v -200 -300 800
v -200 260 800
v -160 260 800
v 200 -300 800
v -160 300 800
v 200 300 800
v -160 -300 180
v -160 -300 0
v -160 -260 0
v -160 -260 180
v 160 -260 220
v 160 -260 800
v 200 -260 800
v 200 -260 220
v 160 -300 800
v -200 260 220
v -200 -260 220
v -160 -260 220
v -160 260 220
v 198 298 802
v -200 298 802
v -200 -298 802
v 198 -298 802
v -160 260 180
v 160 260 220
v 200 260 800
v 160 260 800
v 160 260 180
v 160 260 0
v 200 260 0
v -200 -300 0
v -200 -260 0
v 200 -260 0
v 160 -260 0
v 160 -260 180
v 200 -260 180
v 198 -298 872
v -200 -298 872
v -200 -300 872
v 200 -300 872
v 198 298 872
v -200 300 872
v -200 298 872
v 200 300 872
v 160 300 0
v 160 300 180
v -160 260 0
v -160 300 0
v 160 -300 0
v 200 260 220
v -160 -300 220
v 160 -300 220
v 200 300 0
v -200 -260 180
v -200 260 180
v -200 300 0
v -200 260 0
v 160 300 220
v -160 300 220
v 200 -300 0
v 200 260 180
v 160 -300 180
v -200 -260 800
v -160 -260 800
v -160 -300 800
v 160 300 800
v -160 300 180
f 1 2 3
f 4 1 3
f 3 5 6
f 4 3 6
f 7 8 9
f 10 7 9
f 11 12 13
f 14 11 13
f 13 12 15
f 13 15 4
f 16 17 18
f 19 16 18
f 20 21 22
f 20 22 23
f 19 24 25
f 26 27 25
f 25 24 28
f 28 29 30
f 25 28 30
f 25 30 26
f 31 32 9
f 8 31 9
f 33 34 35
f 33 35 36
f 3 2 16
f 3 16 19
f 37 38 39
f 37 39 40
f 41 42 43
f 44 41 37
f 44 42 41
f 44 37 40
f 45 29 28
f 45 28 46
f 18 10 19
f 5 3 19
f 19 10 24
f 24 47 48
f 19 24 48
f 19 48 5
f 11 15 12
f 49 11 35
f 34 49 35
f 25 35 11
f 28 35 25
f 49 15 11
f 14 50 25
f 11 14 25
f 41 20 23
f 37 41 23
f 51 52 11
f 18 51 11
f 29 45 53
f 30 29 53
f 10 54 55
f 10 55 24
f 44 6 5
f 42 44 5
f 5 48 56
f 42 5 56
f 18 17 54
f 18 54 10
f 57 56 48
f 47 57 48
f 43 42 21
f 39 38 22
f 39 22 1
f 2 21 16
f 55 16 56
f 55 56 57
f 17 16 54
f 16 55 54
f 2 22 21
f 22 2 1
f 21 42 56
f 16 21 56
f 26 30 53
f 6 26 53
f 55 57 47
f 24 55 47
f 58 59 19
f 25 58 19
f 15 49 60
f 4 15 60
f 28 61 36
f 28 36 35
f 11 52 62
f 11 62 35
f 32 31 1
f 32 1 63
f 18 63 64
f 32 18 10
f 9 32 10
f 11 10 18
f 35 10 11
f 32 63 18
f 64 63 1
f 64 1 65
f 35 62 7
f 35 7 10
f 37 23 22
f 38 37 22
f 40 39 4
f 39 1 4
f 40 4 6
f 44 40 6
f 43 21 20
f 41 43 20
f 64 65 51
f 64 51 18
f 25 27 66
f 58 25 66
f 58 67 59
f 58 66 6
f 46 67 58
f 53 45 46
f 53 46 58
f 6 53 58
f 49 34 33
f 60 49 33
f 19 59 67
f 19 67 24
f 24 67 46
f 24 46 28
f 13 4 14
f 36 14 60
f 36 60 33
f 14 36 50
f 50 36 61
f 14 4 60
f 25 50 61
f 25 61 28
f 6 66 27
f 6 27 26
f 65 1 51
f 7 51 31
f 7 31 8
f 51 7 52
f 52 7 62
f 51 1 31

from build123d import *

# Parameters (mm, degrees)
F0_W      = 40
F0_H      = 40
F1_DEPTH  = 800
F2_W      = 400
F2_H      = 600
F3_DEPTH  = 2
F5_DEPTH  = 70
F6_W      = 40
F6_H      = 40
F7_DEPTH  = 520
F8_W      = 40
F8_H      = 40
F9_DEPTH  = 320
F10_W     = 40
F10_H     = 40
F11_DEPTH = 520
F12_W     = 40
F12_H     = 40
F13_DEPTH = 320


with BuildPart() as f1:
    # F0 (on Top) → F1 (new body)
    with BuildSketch(Plane.XY):
        with Locations((-180, 280)):
            Rectangle(F0_W, F0_H)
    extrude(amount=F1_DEPTH)

    # F2 (on face) → F3 (join)
    with BuildSketch(Plane.XY.offset(800)):
        Rectangle(F2_W, F2_H)
    extrude(amount=F3_DEPTH)

    # F4 (on face) → F5 (join)
    with BuildSketch(Plane.XY.offset(802)):
        Polygon((200, 300), (-200, 300), (-200, 298), (198, 298), (198, -298), (-200, -298), (-200, -300), (200, -300), align=None)
    extrude(amount=F5_DEPTH)

    # F6 (on face) → F7 (join, through all)
    with BuildSketch(Plane.XZ.offset(-260)):
        with Locations((-180, 200)):
            Rectangle(F6_W, F6_H)
    extrude(amount=F7_DEPTH)


with BuildPart() as f1b:
    # F0 (on Top) → F1, piece 2 (new body)
    with BuildSketch(Plane.XY):
        with Locations((-180, -280)):
            Rectangle(F0_W, F0_H)
    extrude(amount=F1_DEPTH)

    # F8 (on face) → F9 (join, through all)
    with BuildSketch(Plane.YZ.offset(-160)):
        with Locations((-280, 200)):
            Rectangle(F8_W, F8_H)
    extrude(amount=F9_DEPTH)


with BuildPart() as f1c:
    # F0 (on Top) → F1, piece 3 (new body)
    with BuildSketch(Plane.XY):
        with Locations((180, 280)):
            Rectangle(F0_W, F0_H)
    extrude(amount=F1_DEPTH)

    # F12 (on face) → F13 (join, through all)
    with BuildSketch(Plane(origin=(160, 0, 0), x_dir=(0, -1, 0), z_dir=(-1, 0, 0))):
        with Locations((-280, 200)):
            Rectangle(F12_W, F12_H)
    extrude(amount=F13_DEPTH)


with BuildPart() as f1d:
    # F0 (on Top) → F1, piece 4 (new body)
    with BuildSketch(Plane.XY):
        with Locations((180, -280)):
            Rectangle(F0_W, F0_H)
    extrude(amount=F1_DEPTH)

    # F10 (on face) → F11 (join, through all)
    with BuildSketch(Plane(origin=(0, -260, 0), x_dir=(-1, 0, 0), z_dir=(0, 1, 0))):
        with Locations((-180, 200)):
            Rectangle(F10_W, F10_H)
    extrude(amount=F11_DEPTH)


solid = Compound([f1.part, f1b.part, f1c.part, f1d.part])
